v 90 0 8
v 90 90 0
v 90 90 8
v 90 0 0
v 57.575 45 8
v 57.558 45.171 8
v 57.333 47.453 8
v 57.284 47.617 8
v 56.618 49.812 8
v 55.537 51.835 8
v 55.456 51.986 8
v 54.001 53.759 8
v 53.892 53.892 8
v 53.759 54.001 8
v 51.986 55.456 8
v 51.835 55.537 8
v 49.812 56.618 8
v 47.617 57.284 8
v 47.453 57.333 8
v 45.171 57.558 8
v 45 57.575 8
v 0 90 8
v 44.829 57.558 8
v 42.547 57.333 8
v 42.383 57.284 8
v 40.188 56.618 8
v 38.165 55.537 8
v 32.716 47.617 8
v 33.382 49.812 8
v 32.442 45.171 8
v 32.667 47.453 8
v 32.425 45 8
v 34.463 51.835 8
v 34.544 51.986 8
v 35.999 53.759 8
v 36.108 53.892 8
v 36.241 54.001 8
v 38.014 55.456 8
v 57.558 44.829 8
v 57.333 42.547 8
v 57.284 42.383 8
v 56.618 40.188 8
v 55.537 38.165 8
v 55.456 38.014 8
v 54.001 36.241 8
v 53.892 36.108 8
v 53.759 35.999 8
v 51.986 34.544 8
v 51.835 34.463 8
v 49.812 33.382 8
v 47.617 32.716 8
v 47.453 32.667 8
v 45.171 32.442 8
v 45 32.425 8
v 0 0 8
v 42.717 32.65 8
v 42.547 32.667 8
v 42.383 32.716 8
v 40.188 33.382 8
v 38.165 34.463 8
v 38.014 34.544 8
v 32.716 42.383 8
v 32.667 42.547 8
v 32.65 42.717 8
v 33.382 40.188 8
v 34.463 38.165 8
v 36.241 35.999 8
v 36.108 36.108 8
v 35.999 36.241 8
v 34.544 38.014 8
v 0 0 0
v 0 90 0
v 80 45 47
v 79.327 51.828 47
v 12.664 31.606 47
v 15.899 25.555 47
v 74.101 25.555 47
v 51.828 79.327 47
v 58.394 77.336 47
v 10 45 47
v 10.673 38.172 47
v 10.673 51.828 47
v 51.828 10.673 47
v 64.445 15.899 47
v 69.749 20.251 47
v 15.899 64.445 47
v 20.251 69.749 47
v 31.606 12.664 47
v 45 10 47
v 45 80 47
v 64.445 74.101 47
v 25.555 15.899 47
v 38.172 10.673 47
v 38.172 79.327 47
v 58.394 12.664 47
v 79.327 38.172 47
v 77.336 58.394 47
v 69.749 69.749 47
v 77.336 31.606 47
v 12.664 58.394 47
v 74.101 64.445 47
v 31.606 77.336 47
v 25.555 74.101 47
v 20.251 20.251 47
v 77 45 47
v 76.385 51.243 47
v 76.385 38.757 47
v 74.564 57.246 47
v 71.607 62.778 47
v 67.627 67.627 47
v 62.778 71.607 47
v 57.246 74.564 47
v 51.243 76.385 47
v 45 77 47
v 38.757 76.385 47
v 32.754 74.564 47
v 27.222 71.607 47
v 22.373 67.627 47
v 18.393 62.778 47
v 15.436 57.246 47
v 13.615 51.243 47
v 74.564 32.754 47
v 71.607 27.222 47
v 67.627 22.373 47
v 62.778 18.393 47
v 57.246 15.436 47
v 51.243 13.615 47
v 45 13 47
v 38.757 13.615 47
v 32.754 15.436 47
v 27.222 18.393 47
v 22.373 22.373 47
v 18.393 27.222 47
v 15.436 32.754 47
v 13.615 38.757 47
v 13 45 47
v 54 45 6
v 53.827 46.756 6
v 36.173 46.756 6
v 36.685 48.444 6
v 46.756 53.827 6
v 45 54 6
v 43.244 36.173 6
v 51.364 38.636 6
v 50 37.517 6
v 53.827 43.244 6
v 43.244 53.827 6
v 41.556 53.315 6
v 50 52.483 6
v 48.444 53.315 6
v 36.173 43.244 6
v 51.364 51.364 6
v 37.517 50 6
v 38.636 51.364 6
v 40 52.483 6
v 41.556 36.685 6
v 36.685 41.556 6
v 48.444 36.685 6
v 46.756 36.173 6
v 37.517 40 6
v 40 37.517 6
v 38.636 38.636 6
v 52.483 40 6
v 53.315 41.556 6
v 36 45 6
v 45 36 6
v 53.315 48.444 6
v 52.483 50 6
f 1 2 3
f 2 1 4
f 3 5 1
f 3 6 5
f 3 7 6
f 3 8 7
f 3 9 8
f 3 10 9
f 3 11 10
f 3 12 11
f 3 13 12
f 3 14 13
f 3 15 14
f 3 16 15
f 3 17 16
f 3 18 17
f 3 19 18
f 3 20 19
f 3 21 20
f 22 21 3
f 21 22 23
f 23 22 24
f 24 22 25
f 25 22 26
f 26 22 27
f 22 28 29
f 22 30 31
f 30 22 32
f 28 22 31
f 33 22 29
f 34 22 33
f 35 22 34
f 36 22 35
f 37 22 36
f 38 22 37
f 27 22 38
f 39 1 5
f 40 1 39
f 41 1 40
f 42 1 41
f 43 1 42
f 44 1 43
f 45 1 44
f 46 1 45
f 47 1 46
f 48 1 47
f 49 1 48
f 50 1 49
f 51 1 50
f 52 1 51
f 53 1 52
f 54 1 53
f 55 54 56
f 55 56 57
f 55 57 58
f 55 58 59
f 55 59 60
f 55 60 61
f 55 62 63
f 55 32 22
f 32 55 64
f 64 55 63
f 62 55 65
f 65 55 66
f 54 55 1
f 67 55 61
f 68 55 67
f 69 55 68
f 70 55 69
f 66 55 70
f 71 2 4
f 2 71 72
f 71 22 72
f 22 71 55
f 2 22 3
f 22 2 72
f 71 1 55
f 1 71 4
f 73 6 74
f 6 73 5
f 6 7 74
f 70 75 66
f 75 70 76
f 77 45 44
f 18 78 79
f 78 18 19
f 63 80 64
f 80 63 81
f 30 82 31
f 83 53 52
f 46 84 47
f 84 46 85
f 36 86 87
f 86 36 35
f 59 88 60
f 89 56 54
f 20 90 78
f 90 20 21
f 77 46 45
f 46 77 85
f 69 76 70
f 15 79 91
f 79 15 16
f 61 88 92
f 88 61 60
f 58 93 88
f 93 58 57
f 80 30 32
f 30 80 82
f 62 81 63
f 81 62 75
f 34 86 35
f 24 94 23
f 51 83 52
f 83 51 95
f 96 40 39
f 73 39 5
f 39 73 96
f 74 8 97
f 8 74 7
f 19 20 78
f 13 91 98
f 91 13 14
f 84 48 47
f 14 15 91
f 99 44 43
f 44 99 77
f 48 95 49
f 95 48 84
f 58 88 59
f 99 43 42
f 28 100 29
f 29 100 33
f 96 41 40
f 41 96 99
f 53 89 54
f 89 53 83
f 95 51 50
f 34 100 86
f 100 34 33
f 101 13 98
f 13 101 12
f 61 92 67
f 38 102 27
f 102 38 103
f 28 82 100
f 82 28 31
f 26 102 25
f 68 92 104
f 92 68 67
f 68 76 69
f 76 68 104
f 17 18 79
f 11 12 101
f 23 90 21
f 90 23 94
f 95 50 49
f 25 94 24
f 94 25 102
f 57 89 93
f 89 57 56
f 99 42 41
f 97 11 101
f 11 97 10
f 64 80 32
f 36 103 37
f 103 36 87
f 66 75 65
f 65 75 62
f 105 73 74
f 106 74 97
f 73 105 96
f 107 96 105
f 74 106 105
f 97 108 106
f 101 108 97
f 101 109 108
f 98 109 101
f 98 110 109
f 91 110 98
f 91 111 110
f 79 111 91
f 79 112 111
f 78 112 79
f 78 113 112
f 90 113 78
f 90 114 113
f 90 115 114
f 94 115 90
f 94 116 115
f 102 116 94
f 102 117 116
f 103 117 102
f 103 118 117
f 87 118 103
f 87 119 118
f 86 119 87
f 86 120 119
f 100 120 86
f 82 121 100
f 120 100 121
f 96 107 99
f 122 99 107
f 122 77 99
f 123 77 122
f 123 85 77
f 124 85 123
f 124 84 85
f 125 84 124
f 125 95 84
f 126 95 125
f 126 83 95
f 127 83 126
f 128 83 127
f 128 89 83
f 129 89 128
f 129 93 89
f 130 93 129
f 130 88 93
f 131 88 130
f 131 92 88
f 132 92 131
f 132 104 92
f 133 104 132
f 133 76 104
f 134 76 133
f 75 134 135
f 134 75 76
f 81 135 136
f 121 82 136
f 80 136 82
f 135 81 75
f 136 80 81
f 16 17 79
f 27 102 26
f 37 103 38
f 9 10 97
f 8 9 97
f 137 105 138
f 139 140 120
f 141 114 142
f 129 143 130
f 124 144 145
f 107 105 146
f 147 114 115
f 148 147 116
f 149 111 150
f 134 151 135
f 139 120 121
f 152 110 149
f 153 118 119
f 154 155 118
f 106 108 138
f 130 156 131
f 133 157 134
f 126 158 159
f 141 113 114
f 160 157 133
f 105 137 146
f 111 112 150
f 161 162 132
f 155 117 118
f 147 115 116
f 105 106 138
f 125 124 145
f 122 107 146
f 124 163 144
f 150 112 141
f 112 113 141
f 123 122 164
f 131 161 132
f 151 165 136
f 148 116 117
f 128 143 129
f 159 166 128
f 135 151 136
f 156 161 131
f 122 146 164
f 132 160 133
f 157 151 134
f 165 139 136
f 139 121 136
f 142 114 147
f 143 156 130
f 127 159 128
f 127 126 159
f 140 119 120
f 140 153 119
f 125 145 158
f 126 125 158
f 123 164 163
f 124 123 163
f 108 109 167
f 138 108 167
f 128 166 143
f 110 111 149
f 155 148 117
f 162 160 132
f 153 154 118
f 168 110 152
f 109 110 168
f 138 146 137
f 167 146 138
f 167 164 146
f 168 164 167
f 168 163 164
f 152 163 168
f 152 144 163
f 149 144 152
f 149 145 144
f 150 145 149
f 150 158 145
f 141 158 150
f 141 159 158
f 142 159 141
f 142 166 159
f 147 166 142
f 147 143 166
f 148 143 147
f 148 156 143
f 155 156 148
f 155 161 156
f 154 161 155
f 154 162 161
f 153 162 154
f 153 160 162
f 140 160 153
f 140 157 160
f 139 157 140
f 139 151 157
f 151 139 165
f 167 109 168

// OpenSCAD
$fn = 32;

// ----------------------------------------------------------------------
// Hopper: funnel with square flange
// ----------------------------------------------------------------------

// --- parameters (mm) ---
fl = 90;                  // flange side, X and Y
fl_t = 8;                 // flange thickness
cone_h = 40;              // cone height above the flange
top_d = 70;               // cone mouth diameter
bot_d = 24;               // cone spout diameter
wall = 3;                 // cone wall thickness

bore_d = bot_d - 2 * wall;  // spout bore diameter
total_h = fl_t + cone_h - 1;  // overall height

difference() {
  union() {
    cube([fl, fl, fl_t]);
    translate([fl / 2, fl / 2, fl_t - 1])
      cylinder(h = cone_h, d1 = bot_d, d2 = top_d);
  }
  translate([fl / 2, fl / 2, fl_t - 2])
    cylinder(h = cone_h + 1, d1 = bore_d, d2 = top_d - 2 * wall);
}
